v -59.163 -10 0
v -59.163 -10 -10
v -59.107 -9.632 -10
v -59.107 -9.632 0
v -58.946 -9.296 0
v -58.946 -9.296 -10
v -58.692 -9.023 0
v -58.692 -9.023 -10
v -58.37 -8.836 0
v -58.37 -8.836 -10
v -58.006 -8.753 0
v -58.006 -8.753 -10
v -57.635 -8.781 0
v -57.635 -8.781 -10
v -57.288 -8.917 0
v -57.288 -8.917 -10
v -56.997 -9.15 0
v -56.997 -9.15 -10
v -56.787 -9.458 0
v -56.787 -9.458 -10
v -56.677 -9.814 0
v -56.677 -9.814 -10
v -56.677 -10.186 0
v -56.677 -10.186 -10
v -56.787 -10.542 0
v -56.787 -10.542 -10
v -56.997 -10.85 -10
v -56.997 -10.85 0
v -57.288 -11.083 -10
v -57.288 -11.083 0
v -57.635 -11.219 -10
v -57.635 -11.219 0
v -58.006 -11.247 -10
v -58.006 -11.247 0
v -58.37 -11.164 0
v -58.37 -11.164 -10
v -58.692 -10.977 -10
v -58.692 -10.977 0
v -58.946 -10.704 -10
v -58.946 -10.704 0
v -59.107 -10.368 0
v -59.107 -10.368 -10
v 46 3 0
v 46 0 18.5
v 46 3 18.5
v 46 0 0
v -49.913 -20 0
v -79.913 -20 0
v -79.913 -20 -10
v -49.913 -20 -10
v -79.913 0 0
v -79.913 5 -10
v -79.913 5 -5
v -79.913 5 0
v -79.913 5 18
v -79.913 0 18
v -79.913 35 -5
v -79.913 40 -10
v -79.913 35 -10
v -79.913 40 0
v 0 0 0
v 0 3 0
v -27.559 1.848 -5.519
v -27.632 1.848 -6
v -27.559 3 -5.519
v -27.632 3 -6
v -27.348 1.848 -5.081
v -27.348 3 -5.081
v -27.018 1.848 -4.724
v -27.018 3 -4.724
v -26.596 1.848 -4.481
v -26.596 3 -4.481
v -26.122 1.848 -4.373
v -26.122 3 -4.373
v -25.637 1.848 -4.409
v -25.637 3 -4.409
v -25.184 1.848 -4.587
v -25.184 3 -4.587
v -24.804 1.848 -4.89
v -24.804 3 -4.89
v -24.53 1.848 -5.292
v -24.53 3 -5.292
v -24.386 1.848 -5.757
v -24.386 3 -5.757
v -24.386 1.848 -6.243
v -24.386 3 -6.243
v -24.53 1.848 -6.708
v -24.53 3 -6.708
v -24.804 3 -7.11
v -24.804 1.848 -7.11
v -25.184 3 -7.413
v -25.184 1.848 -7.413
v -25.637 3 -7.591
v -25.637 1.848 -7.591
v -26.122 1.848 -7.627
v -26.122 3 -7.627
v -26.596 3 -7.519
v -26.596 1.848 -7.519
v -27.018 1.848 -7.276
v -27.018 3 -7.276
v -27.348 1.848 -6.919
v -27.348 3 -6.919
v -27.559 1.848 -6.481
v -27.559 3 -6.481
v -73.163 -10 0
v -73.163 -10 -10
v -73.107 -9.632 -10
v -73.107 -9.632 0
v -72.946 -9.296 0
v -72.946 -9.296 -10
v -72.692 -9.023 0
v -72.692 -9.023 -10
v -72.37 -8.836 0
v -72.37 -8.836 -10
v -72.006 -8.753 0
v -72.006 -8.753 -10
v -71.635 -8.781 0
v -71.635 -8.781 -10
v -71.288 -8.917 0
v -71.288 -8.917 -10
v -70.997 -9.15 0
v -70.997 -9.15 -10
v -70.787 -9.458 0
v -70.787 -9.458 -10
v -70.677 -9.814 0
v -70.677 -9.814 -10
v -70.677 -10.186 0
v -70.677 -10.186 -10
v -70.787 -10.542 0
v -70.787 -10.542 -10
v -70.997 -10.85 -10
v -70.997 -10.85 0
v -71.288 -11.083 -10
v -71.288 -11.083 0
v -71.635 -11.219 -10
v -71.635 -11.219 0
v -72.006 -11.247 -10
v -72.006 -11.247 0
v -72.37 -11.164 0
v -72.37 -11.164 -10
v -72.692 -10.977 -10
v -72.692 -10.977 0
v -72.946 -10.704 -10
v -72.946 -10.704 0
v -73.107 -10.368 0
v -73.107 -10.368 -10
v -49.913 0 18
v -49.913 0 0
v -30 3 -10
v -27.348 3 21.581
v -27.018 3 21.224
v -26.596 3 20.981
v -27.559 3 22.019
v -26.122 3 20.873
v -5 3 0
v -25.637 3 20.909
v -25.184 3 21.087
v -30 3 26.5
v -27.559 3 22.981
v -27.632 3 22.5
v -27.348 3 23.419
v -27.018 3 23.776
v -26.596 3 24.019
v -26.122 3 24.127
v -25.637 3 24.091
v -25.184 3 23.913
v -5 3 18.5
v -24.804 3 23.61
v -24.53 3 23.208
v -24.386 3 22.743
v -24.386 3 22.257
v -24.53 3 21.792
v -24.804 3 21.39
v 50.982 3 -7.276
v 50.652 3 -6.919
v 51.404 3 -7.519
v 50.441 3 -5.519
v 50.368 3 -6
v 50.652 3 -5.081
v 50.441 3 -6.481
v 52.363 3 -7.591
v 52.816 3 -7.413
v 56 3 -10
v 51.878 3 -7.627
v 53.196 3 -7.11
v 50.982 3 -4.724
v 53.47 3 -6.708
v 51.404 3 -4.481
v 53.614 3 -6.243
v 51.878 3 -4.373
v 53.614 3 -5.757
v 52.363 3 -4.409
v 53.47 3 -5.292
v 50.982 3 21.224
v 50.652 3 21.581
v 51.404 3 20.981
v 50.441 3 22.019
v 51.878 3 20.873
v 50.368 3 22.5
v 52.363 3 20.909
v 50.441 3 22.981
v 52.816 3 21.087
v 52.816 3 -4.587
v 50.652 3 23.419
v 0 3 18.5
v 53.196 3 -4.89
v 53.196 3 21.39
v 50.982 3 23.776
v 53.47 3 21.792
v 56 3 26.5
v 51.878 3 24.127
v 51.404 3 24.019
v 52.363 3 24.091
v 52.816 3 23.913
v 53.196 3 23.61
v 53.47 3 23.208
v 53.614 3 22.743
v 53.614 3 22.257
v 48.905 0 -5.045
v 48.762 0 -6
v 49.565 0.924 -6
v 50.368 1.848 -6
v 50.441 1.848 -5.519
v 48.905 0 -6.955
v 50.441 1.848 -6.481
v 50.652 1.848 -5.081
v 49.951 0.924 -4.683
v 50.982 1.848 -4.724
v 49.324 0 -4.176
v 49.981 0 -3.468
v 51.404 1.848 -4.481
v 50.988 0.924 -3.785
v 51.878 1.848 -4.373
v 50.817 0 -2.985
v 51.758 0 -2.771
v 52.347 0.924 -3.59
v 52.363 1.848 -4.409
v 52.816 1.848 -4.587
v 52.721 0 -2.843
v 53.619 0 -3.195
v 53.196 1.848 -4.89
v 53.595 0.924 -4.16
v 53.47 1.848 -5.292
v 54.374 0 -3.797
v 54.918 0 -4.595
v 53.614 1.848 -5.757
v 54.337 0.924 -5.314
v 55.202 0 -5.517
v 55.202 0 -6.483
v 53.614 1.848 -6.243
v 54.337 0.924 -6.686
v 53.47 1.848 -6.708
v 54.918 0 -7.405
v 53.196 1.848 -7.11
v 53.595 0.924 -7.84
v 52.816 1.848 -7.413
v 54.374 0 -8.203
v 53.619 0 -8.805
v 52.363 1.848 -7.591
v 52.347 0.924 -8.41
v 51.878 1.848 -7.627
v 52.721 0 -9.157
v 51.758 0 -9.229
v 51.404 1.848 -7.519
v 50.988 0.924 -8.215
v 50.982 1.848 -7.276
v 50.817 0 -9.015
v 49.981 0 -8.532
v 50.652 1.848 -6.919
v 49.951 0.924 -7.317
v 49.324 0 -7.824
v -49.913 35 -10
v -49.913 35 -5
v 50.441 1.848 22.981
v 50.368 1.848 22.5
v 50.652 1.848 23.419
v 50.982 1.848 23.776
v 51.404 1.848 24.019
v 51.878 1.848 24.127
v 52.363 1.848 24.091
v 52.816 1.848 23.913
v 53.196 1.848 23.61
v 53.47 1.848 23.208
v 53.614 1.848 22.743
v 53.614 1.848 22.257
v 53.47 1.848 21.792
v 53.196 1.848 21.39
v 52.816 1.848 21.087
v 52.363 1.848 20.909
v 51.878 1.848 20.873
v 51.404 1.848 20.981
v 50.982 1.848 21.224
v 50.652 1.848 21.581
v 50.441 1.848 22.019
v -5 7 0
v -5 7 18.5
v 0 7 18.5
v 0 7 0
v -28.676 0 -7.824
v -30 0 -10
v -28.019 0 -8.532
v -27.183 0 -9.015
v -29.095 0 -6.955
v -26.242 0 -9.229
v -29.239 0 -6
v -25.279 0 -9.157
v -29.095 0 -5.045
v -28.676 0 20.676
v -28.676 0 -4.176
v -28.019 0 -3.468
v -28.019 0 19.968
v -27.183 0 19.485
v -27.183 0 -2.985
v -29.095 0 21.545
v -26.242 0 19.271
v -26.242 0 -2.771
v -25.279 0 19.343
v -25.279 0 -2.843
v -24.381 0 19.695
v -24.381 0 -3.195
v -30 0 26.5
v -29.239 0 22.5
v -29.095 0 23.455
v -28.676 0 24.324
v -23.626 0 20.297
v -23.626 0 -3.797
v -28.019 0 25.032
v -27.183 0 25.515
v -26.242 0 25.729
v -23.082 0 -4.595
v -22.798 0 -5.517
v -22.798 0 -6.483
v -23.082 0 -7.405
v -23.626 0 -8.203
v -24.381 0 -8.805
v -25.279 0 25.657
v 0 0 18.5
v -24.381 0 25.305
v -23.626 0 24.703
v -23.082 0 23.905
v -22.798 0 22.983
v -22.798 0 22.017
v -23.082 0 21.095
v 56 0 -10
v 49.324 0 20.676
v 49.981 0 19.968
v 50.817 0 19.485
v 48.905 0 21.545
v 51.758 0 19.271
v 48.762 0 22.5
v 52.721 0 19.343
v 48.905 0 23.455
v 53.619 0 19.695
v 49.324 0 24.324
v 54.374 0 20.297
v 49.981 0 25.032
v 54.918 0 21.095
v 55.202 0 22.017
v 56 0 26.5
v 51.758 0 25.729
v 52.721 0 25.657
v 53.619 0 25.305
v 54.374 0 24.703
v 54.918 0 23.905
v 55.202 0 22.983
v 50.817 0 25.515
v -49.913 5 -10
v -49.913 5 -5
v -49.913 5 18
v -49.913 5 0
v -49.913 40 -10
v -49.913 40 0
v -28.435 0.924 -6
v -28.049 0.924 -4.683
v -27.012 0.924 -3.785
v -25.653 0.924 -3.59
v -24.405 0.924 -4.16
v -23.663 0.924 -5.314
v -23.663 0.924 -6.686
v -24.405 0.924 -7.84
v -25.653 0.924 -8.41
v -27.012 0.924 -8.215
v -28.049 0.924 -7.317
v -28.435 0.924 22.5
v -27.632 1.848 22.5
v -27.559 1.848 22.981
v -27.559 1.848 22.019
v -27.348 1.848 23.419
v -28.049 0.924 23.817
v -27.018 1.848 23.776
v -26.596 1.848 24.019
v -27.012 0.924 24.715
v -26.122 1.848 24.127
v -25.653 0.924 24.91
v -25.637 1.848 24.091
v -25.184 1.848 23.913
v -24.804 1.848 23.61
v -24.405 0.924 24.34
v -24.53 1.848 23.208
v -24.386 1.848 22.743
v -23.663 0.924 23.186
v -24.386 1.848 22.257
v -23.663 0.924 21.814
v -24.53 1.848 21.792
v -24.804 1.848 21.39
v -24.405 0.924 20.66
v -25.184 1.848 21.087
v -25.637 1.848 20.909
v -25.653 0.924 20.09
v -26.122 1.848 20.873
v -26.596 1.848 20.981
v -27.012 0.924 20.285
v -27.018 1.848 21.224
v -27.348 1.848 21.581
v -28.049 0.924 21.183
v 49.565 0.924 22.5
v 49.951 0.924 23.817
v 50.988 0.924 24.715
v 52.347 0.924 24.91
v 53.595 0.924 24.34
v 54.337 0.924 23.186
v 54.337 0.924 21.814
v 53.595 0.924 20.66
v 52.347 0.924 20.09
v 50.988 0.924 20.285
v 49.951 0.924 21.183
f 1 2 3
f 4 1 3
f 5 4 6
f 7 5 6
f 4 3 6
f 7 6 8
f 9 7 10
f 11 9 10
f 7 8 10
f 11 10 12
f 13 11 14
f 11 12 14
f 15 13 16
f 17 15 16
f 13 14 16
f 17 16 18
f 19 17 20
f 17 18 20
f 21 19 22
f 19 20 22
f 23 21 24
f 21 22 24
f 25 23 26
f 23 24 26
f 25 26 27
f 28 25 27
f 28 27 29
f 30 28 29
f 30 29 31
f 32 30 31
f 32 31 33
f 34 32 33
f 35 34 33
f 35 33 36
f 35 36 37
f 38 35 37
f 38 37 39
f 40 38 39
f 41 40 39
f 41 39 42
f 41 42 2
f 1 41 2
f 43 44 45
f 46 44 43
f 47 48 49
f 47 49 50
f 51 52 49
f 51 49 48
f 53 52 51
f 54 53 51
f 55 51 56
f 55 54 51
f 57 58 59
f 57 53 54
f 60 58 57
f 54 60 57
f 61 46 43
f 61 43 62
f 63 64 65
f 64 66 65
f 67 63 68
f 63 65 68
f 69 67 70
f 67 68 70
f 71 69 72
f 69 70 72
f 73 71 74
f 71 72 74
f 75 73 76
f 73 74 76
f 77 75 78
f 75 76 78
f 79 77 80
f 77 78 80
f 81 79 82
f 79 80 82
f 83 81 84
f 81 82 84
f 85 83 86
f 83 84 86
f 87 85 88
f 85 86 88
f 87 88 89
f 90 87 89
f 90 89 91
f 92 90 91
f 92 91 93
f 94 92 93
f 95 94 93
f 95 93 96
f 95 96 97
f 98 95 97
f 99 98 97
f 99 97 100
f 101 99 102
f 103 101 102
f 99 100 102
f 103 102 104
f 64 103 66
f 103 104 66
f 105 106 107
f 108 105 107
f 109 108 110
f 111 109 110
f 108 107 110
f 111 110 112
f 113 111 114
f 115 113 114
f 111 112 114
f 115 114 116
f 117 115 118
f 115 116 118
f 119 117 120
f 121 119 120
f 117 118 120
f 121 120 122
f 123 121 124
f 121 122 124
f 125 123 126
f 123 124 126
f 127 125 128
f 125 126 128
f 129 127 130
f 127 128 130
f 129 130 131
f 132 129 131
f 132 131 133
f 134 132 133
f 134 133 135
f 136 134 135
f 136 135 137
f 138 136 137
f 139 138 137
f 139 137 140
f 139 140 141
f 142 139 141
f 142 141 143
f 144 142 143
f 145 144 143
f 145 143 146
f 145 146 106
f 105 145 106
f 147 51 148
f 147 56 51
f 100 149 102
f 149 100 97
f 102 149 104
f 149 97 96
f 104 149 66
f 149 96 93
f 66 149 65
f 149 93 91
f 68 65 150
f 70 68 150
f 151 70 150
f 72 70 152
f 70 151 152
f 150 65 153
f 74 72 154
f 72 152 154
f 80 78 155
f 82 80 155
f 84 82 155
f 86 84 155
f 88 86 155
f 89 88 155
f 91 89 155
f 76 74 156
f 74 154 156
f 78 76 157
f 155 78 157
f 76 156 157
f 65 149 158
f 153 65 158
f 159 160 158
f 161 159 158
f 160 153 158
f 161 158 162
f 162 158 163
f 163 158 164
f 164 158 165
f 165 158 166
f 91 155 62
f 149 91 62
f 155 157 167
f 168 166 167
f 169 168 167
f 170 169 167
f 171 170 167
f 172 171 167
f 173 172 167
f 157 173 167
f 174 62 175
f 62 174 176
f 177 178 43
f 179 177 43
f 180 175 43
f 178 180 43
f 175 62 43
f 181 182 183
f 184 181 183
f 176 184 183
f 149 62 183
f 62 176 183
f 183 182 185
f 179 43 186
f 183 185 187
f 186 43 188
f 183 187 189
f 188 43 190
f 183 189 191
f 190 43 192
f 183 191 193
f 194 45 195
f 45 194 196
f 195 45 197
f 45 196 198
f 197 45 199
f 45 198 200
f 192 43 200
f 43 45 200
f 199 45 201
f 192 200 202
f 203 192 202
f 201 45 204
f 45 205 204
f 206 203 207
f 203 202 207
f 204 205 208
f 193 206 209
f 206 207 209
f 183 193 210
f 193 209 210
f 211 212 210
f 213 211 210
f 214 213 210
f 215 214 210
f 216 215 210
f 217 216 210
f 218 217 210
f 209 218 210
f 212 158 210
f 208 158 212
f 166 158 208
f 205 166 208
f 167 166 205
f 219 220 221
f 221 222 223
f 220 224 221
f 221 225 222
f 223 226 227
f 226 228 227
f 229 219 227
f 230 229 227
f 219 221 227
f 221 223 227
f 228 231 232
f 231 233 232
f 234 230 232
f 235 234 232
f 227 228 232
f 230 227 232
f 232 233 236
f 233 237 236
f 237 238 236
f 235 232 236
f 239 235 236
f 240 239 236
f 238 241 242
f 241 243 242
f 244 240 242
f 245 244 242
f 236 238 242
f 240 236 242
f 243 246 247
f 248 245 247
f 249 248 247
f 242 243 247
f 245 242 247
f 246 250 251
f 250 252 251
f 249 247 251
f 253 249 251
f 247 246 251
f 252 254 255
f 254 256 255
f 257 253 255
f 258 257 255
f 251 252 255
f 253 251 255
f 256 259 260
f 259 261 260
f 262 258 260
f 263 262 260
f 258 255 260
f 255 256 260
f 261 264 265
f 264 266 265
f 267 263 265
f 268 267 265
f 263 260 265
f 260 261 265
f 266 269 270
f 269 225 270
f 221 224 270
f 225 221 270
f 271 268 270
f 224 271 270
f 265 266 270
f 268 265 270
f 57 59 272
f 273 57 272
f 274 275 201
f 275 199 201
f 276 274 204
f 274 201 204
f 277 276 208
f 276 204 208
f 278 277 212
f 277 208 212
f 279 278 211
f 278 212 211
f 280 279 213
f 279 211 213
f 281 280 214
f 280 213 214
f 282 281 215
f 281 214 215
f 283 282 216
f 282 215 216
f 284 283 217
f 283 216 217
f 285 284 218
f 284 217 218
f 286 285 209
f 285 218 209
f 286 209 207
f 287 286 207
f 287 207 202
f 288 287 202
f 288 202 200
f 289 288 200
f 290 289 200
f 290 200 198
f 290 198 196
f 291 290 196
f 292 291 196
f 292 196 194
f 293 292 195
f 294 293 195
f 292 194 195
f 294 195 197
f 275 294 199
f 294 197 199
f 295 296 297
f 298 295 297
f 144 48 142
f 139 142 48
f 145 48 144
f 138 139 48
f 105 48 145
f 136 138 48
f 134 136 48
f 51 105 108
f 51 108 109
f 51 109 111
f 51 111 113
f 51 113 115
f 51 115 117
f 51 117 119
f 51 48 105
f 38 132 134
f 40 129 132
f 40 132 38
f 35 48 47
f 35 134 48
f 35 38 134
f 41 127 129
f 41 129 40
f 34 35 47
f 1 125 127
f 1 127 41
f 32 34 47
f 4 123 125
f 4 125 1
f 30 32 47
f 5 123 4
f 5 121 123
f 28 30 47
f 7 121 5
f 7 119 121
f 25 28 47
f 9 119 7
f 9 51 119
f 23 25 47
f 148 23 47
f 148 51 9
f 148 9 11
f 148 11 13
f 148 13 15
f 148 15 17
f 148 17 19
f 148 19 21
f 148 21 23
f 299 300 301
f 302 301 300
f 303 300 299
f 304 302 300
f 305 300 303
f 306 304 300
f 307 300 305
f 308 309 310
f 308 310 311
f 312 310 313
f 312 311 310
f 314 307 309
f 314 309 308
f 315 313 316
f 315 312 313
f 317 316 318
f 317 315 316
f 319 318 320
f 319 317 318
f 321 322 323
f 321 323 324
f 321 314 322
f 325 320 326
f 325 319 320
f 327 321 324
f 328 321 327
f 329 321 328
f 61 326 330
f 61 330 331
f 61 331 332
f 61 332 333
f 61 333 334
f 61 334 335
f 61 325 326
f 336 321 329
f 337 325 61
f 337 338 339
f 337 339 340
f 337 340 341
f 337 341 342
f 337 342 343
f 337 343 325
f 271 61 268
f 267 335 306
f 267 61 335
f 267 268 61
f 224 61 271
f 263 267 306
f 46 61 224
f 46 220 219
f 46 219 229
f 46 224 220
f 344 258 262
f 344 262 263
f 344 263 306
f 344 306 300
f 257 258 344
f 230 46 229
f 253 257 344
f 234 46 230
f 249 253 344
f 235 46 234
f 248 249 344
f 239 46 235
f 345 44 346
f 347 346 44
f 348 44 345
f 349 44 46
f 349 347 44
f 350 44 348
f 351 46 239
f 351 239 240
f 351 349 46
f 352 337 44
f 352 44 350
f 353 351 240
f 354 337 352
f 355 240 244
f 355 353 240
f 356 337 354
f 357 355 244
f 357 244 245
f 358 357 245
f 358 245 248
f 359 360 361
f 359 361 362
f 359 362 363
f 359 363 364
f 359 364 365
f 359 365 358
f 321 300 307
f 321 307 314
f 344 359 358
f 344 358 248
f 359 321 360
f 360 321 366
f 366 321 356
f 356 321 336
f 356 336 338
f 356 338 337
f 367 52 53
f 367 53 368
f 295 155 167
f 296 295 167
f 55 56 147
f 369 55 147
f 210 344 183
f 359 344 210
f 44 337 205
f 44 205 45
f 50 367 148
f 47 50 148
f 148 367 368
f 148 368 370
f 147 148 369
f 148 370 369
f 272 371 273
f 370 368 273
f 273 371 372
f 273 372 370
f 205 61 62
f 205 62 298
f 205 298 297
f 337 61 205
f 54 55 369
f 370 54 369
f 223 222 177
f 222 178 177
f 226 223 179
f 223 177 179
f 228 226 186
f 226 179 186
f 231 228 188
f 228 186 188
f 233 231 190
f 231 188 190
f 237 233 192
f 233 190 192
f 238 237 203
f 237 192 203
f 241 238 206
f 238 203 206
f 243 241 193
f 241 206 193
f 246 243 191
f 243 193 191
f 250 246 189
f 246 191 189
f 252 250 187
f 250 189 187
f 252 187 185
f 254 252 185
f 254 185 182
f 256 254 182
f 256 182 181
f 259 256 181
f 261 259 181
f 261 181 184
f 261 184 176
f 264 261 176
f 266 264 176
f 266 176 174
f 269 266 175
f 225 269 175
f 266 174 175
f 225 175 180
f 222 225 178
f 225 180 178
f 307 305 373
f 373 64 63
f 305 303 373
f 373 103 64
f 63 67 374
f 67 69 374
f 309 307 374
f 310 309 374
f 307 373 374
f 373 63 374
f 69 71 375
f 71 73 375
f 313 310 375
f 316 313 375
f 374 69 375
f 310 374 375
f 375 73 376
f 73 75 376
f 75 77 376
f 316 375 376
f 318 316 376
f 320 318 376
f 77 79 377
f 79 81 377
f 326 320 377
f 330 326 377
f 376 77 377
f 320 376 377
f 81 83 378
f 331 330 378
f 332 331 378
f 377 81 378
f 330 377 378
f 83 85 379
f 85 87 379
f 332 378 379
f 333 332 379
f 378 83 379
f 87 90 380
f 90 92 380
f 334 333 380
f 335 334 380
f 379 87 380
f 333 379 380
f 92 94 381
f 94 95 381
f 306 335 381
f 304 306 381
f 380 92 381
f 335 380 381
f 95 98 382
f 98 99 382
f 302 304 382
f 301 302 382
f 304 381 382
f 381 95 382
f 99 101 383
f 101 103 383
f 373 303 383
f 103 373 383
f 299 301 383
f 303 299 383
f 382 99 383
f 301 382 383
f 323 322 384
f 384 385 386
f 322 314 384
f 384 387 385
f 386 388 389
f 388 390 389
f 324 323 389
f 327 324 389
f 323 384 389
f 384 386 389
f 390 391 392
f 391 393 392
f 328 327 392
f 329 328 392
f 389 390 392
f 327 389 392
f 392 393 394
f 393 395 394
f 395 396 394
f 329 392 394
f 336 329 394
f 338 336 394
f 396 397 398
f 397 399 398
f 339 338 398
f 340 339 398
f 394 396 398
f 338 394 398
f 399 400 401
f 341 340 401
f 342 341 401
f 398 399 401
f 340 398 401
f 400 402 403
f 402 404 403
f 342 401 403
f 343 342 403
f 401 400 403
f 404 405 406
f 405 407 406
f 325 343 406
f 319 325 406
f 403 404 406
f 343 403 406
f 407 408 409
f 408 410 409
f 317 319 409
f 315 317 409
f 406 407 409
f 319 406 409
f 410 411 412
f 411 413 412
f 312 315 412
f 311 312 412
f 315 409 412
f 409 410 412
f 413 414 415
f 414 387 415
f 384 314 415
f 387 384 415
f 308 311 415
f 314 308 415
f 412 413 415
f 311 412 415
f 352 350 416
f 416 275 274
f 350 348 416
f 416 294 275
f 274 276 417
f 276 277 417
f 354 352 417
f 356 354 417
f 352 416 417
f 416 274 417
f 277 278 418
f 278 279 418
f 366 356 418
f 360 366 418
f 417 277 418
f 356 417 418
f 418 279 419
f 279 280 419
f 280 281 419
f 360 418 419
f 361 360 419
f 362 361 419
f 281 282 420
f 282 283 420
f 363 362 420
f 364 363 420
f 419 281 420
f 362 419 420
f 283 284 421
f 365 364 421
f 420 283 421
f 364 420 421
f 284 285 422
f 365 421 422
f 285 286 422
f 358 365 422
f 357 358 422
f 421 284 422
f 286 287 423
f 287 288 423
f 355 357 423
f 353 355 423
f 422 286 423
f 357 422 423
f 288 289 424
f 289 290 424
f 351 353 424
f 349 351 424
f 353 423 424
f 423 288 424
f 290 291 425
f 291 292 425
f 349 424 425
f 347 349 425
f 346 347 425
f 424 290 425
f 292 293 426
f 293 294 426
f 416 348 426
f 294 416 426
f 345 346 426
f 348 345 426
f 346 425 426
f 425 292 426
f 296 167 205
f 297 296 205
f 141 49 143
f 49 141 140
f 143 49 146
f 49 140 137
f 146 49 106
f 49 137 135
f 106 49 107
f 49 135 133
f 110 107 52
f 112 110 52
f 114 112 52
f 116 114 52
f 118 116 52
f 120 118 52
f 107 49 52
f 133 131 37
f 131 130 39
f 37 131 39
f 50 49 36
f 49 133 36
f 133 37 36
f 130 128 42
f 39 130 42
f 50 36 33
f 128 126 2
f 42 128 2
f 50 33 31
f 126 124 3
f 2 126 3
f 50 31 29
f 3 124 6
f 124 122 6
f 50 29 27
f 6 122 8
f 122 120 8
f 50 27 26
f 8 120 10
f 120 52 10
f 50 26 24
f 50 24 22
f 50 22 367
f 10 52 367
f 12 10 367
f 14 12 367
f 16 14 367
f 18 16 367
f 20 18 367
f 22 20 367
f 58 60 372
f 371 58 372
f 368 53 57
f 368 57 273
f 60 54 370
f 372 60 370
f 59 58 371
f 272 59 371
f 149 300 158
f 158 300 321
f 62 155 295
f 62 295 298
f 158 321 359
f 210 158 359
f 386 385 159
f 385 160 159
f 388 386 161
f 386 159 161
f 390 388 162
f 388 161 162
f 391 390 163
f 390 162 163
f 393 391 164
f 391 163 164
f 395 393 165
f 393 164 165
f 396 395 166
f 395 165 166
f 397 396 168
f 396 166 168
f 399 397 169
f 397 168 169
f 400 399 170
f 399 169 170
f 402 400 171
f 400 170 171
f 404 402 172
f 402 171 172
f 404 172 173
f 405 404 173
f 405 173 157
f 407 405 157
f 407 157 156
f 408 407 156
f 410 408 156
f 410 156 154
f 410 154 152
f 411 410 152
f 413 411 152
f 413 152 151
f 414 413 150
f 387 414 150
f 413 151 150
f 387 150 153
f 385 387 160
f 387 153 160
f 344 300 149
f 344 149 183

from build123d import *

# Parameters (mm, degrees)
F0_W           = 86
F0_H           = 36.5
F0_W_2         = 5
F0_H_2         = 18.5
F1_DEPTH       = 3
F2_D           = 3.2639
F2_CSINK_D     = 6.477
F2_CSINK_ANGLE = 82
F3_W           = 30
F3_H           = 18
F3_H_2         = 10
F4_DEPTH       = 5
F5_DEPTH       = 40
F5_DEPTH_BACK  = 20
F6_W           = 30
F6_H           = 30
F7_DEPTH       = 5
F9_D           = 2.5
F10_DEPTH      = 7


# Not quite as in the source:
# - a feature names something its author has since deleted; it is built from what else it names


with BuildPart() as f1:
    # F0 (on Front) → F1 (new body)
    with BuildSketch(Plane.XZ):
        with Locations((13, 8.25)):
            Rectangle(F0_W, F0_H)
        Polygon((-5, 18.5), (0, 18.5), (46, 18.5), (46, 0), (0, 0), (-5, 0), align=None, mode=Mode.SUBTRACT)
        with Locations((-2.5, 9.25)):
            Rectangle(F0_W_2, F0_H_2)
    extrude(amount=-F1_DEPTH)

    # F2 (through all)
    with Locations(Plane.XZ):
        with Locations((-26, 22.5), (52, 22.5), (52, -6), (-26, -6)):
            CounterSinkHole(F2_D / 2, F2_CSINK_D / 2, counter_sink_angle=F2_CSINK_ANGLE)

    # F0 (on Front) → F10 (join)
    with BuildSketch(Plane.XZ):
        with Locations((-2.5, 9.25)):
            Rectangle(F0_W_2, F0_H_2)
    extrude(amount=-F10_DEPTH)


with BuildPart() as f4:
    # F3 (on Front) → F4 (new body)
    with BuildSketch(Plane.XZ):
        with Locations((-64.9130126834, 9)):
            Rectangle(F3_W, F3_H)
        with Locations((-64.9130126834, -5)):
            Rectangle(F3_W, F3_H_2)
    extrude(amount=-F4_DEPTH)

    # F3 (on Front) → F5 (join, two sides)
    with BuildSketch(Plane.XZ) as f5_sk:
        with Locations((-64.9130126834, -5)):
            Rectangle(F3_W, F3_H_2)
    extrude(amount=-F5_DEPTH)
    extrude(f5_sk.sketch, amount=F5_DEPTH_BACK)

    # F6 (on face) → F7 (cut)
    with BuildSketch(Plane(origin=(0, 0, -10), x_dir=(1, 0, 0), z_dir=(0, 0, -1))):
        with Locations((-64.9130126834, -20)):
            Rectangle(F6_W, F6_H)
    extrude(amount=-F7_DEPTH, mode=Mode.SUBTRACT)

    # F9 (through all)
    with Locations(Plane.XY):
        with Locations((-71.9130126834, -10), (-57.9130126834, -10)):
            Hole(F9_D / 2)


solid = Compound([f1.part, f4.part])
